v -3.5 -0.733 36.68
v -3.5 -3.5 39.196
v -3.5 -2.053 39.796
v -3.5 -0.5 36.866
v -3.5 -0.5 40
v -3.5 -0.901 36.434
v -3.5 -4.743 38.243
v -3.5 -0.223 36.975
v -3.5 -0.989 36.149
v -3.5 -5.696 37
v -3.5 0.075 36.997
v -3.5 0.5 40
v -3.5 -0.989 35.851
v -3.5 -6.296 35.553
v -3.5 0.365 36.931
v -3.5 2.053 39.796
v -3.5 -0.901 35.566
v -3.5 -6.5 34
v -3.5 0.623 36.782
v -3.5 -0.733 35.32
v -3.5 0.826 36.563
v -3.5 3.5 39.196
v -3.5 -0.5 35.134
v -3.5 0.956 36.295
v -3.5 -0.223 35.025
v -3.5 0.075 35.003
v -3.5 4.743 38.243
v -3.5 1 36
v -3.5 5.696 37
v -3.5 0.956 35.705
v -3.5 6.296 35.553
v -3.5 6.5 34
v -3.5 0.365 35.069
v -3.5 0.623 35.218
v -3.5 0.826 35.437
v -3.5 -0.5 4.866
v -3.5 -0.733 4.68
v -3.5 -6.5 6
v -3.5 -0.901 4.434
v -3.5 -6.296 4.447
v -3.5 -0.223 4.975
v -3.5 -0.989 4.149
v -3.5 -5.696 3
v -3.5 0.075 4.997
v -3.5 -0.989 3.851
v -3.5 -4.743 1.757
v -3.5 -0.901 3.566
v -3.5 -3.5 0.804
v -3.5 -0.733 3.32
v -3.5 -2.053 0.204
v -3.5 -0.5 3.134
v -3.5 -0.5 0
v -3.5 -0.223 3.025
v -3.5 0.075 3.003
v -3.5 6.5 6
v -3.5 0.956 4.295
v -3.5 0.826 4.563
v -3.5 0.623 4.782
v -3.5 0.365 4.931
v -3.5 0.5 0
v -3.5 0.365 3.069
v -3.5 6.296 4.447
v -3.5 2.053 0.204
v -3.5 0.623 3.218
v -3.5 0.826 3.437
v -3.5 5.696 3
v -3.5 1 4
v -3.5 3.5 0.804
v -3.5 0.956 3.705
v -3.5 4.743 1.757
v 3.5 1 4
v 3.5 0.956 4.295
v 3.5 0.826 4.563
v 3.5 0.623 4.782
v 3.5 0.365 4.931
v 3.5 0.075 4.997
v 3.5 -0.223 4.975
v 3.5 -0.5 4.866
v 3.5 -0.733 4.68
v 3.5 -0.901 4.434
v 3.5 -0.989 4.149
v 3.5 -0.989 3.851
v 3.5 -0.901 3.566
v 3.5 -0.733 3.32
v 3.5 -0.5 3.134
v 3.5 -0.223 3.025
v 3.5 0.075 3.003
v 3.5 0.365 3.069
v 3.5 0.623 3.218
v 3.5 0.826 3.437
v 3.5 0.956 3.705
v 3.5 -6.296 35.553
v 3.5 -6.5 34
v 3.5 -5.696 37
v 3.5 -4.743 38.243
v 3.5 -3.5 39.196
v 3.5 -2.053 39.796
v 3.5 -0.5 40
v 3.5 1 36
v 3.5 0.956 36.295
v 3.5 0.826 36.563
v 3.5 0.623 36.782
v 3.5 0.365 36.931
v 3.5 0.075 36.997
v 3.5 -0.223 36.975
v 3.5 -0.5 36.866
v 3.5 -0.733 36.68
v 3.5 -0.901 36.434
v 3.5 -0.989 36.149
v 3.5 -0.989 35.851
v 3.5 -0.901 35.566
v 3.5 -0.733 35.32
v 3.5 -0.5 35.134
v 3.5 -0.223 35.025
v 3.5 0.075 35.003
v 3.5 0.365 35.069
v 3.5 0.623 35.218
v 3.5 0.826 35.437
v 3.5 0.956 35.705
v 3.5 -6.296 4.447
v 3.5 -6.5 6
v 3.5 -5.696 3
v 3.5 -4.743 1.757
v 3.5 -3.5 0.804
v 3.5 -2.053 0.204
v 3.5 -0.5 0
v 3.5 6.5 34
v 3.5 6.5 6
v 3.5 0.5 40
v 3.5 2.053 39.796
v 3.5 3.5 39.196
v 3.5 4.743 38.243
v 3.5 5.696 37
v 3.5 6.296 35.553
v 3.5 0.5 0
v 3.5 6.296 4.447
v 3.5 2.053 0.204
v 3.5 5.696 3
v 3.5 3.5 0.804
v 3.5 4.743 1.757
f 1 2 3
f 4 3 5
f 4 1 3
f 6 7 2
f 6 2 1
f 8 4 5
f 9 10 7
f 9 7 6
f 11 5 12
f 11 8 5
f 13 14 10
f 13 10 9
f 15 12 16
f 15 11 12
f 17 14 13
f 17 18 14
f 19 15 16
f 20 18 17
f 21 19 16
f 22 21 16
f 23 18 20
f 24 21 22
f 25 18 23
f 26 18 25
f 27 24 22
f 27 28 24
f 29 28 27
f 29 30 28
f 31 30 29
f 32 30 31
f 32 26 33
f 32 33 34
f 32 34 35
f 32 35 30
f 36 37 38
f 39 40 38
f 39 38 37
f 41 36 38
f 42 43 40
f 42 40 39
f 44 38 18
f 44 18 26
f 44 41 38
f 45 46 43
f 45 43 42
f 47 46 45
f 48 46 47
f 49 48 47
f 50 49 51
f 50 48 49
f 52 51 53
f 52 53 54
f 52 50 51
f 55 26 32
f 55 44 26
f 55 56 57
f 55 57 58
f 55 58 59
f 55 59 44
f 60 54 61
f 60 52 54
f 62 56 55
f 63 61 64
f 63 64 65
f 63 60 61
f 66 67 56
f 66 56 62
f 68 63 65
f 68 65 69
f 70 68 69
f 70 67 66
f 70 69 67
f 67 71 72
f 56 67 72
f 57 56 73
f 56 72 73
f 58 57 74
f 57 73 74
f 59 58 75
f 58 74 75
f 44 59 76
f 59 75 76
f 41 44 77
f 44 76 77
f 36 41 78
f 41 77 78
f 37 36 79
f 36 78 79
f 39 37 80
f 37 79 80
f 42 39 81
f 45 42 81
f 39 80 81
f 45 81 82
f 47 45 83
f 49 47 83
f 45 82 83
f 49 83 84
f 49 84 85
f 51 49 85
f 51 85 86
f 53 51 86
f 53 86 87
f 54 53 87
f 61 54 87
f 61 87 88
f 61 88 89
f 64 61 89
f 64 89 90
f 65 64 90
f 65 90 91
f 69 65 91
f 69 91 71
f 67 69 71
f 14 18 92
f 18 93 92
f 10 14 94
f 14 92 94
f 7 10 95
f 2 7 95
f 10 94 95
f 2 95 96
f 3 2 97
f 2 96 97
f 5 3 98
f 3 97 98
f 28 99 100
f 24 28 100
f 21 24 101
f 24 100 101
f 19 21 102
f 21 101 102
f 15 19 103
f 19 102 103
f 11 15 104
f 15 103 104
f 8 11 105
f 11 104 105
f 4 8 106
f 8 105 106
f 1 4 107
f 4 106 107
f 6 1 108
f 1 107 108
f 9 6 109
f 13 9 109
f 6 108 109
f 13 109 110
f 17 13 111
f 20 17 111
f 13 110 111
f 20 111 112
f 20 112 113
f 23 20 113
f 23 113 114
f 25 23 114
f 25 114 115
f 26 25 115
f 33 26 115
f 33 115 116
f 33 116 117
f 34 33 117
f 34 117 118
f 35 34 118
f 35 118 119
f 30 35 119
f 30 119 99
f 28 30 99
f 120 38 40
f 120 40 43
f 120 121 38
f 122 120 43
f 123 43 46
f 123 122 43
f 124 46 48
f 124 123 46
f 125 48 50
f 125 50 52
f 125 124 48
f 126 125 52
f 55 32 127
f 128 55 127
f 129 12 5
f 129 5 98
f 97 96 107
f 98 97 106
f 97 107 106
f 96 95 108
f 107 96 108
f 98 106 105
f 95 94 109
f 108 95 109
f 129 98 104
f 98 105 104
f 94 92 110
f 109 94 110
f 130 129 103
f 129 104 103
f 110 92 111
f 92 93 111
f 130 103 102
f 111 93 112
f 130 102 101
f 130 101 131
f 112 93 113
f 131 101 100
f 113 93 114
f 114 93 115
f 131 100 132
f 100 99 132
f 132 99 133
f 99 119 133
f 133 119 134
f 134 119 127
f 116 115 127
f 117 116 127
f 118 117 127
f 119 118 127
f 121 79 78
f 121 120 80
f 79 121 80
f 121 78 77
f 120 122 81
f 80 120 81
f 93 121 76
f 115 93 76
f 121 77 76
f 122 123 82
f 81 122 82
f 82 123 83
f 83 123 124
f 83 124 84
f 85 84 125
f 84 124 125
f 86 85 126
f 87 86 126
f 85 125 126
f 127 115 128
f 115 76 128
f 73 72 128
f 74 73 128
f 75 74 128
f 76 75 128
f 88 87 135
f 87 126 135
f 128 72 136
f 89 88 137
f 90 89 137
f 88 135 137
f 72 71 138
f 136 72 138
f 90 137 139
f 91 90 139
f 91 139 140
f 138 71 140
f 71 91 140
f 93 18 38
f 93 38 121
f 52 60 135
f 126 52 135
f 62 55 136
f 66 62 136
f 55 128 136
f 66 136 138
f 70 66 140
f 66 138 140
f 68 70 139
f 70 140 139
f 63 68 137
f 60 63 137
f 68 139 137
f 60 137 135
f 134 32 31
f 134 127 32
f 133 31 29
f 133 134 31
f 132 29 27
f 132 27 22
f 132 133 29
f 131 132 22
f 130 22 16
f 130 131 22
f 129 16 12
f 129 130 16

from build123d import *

# Parameters (mm, degrees)
F0_W     = 7
F0_H     = 13
F1_DEPTH = 40
F2_R     = 6
F5_D     = 2


with BuildPart() as f1:
    # F0 (on Top) → F1 (new body)
    with BuildSketch(Plane.XY):
        Rectangle(F0_W, F0_H)
    extrude(amount=F1_DEPTH)

    # F2
    f2_edges = [f1.edges().sort_by_distance(p)[0] for p in [
        (0, 6.5, 40),
        (0, -6.5, 40),
        (0, 6.5, 0),
        (0, -6.5, 0),
    ]]
    fillet(f2_edges, radius=F2_R)

    # F5 (through all)
    with Locations(Plane(origin=(-3.5, 0, 0), x_dir=(0, -1, 0), z_dir=(-1, 0, 0))):
        with Locations((0, 4), (0, 36)):
            Hole(F5_D / 2)


solid = f1.part
